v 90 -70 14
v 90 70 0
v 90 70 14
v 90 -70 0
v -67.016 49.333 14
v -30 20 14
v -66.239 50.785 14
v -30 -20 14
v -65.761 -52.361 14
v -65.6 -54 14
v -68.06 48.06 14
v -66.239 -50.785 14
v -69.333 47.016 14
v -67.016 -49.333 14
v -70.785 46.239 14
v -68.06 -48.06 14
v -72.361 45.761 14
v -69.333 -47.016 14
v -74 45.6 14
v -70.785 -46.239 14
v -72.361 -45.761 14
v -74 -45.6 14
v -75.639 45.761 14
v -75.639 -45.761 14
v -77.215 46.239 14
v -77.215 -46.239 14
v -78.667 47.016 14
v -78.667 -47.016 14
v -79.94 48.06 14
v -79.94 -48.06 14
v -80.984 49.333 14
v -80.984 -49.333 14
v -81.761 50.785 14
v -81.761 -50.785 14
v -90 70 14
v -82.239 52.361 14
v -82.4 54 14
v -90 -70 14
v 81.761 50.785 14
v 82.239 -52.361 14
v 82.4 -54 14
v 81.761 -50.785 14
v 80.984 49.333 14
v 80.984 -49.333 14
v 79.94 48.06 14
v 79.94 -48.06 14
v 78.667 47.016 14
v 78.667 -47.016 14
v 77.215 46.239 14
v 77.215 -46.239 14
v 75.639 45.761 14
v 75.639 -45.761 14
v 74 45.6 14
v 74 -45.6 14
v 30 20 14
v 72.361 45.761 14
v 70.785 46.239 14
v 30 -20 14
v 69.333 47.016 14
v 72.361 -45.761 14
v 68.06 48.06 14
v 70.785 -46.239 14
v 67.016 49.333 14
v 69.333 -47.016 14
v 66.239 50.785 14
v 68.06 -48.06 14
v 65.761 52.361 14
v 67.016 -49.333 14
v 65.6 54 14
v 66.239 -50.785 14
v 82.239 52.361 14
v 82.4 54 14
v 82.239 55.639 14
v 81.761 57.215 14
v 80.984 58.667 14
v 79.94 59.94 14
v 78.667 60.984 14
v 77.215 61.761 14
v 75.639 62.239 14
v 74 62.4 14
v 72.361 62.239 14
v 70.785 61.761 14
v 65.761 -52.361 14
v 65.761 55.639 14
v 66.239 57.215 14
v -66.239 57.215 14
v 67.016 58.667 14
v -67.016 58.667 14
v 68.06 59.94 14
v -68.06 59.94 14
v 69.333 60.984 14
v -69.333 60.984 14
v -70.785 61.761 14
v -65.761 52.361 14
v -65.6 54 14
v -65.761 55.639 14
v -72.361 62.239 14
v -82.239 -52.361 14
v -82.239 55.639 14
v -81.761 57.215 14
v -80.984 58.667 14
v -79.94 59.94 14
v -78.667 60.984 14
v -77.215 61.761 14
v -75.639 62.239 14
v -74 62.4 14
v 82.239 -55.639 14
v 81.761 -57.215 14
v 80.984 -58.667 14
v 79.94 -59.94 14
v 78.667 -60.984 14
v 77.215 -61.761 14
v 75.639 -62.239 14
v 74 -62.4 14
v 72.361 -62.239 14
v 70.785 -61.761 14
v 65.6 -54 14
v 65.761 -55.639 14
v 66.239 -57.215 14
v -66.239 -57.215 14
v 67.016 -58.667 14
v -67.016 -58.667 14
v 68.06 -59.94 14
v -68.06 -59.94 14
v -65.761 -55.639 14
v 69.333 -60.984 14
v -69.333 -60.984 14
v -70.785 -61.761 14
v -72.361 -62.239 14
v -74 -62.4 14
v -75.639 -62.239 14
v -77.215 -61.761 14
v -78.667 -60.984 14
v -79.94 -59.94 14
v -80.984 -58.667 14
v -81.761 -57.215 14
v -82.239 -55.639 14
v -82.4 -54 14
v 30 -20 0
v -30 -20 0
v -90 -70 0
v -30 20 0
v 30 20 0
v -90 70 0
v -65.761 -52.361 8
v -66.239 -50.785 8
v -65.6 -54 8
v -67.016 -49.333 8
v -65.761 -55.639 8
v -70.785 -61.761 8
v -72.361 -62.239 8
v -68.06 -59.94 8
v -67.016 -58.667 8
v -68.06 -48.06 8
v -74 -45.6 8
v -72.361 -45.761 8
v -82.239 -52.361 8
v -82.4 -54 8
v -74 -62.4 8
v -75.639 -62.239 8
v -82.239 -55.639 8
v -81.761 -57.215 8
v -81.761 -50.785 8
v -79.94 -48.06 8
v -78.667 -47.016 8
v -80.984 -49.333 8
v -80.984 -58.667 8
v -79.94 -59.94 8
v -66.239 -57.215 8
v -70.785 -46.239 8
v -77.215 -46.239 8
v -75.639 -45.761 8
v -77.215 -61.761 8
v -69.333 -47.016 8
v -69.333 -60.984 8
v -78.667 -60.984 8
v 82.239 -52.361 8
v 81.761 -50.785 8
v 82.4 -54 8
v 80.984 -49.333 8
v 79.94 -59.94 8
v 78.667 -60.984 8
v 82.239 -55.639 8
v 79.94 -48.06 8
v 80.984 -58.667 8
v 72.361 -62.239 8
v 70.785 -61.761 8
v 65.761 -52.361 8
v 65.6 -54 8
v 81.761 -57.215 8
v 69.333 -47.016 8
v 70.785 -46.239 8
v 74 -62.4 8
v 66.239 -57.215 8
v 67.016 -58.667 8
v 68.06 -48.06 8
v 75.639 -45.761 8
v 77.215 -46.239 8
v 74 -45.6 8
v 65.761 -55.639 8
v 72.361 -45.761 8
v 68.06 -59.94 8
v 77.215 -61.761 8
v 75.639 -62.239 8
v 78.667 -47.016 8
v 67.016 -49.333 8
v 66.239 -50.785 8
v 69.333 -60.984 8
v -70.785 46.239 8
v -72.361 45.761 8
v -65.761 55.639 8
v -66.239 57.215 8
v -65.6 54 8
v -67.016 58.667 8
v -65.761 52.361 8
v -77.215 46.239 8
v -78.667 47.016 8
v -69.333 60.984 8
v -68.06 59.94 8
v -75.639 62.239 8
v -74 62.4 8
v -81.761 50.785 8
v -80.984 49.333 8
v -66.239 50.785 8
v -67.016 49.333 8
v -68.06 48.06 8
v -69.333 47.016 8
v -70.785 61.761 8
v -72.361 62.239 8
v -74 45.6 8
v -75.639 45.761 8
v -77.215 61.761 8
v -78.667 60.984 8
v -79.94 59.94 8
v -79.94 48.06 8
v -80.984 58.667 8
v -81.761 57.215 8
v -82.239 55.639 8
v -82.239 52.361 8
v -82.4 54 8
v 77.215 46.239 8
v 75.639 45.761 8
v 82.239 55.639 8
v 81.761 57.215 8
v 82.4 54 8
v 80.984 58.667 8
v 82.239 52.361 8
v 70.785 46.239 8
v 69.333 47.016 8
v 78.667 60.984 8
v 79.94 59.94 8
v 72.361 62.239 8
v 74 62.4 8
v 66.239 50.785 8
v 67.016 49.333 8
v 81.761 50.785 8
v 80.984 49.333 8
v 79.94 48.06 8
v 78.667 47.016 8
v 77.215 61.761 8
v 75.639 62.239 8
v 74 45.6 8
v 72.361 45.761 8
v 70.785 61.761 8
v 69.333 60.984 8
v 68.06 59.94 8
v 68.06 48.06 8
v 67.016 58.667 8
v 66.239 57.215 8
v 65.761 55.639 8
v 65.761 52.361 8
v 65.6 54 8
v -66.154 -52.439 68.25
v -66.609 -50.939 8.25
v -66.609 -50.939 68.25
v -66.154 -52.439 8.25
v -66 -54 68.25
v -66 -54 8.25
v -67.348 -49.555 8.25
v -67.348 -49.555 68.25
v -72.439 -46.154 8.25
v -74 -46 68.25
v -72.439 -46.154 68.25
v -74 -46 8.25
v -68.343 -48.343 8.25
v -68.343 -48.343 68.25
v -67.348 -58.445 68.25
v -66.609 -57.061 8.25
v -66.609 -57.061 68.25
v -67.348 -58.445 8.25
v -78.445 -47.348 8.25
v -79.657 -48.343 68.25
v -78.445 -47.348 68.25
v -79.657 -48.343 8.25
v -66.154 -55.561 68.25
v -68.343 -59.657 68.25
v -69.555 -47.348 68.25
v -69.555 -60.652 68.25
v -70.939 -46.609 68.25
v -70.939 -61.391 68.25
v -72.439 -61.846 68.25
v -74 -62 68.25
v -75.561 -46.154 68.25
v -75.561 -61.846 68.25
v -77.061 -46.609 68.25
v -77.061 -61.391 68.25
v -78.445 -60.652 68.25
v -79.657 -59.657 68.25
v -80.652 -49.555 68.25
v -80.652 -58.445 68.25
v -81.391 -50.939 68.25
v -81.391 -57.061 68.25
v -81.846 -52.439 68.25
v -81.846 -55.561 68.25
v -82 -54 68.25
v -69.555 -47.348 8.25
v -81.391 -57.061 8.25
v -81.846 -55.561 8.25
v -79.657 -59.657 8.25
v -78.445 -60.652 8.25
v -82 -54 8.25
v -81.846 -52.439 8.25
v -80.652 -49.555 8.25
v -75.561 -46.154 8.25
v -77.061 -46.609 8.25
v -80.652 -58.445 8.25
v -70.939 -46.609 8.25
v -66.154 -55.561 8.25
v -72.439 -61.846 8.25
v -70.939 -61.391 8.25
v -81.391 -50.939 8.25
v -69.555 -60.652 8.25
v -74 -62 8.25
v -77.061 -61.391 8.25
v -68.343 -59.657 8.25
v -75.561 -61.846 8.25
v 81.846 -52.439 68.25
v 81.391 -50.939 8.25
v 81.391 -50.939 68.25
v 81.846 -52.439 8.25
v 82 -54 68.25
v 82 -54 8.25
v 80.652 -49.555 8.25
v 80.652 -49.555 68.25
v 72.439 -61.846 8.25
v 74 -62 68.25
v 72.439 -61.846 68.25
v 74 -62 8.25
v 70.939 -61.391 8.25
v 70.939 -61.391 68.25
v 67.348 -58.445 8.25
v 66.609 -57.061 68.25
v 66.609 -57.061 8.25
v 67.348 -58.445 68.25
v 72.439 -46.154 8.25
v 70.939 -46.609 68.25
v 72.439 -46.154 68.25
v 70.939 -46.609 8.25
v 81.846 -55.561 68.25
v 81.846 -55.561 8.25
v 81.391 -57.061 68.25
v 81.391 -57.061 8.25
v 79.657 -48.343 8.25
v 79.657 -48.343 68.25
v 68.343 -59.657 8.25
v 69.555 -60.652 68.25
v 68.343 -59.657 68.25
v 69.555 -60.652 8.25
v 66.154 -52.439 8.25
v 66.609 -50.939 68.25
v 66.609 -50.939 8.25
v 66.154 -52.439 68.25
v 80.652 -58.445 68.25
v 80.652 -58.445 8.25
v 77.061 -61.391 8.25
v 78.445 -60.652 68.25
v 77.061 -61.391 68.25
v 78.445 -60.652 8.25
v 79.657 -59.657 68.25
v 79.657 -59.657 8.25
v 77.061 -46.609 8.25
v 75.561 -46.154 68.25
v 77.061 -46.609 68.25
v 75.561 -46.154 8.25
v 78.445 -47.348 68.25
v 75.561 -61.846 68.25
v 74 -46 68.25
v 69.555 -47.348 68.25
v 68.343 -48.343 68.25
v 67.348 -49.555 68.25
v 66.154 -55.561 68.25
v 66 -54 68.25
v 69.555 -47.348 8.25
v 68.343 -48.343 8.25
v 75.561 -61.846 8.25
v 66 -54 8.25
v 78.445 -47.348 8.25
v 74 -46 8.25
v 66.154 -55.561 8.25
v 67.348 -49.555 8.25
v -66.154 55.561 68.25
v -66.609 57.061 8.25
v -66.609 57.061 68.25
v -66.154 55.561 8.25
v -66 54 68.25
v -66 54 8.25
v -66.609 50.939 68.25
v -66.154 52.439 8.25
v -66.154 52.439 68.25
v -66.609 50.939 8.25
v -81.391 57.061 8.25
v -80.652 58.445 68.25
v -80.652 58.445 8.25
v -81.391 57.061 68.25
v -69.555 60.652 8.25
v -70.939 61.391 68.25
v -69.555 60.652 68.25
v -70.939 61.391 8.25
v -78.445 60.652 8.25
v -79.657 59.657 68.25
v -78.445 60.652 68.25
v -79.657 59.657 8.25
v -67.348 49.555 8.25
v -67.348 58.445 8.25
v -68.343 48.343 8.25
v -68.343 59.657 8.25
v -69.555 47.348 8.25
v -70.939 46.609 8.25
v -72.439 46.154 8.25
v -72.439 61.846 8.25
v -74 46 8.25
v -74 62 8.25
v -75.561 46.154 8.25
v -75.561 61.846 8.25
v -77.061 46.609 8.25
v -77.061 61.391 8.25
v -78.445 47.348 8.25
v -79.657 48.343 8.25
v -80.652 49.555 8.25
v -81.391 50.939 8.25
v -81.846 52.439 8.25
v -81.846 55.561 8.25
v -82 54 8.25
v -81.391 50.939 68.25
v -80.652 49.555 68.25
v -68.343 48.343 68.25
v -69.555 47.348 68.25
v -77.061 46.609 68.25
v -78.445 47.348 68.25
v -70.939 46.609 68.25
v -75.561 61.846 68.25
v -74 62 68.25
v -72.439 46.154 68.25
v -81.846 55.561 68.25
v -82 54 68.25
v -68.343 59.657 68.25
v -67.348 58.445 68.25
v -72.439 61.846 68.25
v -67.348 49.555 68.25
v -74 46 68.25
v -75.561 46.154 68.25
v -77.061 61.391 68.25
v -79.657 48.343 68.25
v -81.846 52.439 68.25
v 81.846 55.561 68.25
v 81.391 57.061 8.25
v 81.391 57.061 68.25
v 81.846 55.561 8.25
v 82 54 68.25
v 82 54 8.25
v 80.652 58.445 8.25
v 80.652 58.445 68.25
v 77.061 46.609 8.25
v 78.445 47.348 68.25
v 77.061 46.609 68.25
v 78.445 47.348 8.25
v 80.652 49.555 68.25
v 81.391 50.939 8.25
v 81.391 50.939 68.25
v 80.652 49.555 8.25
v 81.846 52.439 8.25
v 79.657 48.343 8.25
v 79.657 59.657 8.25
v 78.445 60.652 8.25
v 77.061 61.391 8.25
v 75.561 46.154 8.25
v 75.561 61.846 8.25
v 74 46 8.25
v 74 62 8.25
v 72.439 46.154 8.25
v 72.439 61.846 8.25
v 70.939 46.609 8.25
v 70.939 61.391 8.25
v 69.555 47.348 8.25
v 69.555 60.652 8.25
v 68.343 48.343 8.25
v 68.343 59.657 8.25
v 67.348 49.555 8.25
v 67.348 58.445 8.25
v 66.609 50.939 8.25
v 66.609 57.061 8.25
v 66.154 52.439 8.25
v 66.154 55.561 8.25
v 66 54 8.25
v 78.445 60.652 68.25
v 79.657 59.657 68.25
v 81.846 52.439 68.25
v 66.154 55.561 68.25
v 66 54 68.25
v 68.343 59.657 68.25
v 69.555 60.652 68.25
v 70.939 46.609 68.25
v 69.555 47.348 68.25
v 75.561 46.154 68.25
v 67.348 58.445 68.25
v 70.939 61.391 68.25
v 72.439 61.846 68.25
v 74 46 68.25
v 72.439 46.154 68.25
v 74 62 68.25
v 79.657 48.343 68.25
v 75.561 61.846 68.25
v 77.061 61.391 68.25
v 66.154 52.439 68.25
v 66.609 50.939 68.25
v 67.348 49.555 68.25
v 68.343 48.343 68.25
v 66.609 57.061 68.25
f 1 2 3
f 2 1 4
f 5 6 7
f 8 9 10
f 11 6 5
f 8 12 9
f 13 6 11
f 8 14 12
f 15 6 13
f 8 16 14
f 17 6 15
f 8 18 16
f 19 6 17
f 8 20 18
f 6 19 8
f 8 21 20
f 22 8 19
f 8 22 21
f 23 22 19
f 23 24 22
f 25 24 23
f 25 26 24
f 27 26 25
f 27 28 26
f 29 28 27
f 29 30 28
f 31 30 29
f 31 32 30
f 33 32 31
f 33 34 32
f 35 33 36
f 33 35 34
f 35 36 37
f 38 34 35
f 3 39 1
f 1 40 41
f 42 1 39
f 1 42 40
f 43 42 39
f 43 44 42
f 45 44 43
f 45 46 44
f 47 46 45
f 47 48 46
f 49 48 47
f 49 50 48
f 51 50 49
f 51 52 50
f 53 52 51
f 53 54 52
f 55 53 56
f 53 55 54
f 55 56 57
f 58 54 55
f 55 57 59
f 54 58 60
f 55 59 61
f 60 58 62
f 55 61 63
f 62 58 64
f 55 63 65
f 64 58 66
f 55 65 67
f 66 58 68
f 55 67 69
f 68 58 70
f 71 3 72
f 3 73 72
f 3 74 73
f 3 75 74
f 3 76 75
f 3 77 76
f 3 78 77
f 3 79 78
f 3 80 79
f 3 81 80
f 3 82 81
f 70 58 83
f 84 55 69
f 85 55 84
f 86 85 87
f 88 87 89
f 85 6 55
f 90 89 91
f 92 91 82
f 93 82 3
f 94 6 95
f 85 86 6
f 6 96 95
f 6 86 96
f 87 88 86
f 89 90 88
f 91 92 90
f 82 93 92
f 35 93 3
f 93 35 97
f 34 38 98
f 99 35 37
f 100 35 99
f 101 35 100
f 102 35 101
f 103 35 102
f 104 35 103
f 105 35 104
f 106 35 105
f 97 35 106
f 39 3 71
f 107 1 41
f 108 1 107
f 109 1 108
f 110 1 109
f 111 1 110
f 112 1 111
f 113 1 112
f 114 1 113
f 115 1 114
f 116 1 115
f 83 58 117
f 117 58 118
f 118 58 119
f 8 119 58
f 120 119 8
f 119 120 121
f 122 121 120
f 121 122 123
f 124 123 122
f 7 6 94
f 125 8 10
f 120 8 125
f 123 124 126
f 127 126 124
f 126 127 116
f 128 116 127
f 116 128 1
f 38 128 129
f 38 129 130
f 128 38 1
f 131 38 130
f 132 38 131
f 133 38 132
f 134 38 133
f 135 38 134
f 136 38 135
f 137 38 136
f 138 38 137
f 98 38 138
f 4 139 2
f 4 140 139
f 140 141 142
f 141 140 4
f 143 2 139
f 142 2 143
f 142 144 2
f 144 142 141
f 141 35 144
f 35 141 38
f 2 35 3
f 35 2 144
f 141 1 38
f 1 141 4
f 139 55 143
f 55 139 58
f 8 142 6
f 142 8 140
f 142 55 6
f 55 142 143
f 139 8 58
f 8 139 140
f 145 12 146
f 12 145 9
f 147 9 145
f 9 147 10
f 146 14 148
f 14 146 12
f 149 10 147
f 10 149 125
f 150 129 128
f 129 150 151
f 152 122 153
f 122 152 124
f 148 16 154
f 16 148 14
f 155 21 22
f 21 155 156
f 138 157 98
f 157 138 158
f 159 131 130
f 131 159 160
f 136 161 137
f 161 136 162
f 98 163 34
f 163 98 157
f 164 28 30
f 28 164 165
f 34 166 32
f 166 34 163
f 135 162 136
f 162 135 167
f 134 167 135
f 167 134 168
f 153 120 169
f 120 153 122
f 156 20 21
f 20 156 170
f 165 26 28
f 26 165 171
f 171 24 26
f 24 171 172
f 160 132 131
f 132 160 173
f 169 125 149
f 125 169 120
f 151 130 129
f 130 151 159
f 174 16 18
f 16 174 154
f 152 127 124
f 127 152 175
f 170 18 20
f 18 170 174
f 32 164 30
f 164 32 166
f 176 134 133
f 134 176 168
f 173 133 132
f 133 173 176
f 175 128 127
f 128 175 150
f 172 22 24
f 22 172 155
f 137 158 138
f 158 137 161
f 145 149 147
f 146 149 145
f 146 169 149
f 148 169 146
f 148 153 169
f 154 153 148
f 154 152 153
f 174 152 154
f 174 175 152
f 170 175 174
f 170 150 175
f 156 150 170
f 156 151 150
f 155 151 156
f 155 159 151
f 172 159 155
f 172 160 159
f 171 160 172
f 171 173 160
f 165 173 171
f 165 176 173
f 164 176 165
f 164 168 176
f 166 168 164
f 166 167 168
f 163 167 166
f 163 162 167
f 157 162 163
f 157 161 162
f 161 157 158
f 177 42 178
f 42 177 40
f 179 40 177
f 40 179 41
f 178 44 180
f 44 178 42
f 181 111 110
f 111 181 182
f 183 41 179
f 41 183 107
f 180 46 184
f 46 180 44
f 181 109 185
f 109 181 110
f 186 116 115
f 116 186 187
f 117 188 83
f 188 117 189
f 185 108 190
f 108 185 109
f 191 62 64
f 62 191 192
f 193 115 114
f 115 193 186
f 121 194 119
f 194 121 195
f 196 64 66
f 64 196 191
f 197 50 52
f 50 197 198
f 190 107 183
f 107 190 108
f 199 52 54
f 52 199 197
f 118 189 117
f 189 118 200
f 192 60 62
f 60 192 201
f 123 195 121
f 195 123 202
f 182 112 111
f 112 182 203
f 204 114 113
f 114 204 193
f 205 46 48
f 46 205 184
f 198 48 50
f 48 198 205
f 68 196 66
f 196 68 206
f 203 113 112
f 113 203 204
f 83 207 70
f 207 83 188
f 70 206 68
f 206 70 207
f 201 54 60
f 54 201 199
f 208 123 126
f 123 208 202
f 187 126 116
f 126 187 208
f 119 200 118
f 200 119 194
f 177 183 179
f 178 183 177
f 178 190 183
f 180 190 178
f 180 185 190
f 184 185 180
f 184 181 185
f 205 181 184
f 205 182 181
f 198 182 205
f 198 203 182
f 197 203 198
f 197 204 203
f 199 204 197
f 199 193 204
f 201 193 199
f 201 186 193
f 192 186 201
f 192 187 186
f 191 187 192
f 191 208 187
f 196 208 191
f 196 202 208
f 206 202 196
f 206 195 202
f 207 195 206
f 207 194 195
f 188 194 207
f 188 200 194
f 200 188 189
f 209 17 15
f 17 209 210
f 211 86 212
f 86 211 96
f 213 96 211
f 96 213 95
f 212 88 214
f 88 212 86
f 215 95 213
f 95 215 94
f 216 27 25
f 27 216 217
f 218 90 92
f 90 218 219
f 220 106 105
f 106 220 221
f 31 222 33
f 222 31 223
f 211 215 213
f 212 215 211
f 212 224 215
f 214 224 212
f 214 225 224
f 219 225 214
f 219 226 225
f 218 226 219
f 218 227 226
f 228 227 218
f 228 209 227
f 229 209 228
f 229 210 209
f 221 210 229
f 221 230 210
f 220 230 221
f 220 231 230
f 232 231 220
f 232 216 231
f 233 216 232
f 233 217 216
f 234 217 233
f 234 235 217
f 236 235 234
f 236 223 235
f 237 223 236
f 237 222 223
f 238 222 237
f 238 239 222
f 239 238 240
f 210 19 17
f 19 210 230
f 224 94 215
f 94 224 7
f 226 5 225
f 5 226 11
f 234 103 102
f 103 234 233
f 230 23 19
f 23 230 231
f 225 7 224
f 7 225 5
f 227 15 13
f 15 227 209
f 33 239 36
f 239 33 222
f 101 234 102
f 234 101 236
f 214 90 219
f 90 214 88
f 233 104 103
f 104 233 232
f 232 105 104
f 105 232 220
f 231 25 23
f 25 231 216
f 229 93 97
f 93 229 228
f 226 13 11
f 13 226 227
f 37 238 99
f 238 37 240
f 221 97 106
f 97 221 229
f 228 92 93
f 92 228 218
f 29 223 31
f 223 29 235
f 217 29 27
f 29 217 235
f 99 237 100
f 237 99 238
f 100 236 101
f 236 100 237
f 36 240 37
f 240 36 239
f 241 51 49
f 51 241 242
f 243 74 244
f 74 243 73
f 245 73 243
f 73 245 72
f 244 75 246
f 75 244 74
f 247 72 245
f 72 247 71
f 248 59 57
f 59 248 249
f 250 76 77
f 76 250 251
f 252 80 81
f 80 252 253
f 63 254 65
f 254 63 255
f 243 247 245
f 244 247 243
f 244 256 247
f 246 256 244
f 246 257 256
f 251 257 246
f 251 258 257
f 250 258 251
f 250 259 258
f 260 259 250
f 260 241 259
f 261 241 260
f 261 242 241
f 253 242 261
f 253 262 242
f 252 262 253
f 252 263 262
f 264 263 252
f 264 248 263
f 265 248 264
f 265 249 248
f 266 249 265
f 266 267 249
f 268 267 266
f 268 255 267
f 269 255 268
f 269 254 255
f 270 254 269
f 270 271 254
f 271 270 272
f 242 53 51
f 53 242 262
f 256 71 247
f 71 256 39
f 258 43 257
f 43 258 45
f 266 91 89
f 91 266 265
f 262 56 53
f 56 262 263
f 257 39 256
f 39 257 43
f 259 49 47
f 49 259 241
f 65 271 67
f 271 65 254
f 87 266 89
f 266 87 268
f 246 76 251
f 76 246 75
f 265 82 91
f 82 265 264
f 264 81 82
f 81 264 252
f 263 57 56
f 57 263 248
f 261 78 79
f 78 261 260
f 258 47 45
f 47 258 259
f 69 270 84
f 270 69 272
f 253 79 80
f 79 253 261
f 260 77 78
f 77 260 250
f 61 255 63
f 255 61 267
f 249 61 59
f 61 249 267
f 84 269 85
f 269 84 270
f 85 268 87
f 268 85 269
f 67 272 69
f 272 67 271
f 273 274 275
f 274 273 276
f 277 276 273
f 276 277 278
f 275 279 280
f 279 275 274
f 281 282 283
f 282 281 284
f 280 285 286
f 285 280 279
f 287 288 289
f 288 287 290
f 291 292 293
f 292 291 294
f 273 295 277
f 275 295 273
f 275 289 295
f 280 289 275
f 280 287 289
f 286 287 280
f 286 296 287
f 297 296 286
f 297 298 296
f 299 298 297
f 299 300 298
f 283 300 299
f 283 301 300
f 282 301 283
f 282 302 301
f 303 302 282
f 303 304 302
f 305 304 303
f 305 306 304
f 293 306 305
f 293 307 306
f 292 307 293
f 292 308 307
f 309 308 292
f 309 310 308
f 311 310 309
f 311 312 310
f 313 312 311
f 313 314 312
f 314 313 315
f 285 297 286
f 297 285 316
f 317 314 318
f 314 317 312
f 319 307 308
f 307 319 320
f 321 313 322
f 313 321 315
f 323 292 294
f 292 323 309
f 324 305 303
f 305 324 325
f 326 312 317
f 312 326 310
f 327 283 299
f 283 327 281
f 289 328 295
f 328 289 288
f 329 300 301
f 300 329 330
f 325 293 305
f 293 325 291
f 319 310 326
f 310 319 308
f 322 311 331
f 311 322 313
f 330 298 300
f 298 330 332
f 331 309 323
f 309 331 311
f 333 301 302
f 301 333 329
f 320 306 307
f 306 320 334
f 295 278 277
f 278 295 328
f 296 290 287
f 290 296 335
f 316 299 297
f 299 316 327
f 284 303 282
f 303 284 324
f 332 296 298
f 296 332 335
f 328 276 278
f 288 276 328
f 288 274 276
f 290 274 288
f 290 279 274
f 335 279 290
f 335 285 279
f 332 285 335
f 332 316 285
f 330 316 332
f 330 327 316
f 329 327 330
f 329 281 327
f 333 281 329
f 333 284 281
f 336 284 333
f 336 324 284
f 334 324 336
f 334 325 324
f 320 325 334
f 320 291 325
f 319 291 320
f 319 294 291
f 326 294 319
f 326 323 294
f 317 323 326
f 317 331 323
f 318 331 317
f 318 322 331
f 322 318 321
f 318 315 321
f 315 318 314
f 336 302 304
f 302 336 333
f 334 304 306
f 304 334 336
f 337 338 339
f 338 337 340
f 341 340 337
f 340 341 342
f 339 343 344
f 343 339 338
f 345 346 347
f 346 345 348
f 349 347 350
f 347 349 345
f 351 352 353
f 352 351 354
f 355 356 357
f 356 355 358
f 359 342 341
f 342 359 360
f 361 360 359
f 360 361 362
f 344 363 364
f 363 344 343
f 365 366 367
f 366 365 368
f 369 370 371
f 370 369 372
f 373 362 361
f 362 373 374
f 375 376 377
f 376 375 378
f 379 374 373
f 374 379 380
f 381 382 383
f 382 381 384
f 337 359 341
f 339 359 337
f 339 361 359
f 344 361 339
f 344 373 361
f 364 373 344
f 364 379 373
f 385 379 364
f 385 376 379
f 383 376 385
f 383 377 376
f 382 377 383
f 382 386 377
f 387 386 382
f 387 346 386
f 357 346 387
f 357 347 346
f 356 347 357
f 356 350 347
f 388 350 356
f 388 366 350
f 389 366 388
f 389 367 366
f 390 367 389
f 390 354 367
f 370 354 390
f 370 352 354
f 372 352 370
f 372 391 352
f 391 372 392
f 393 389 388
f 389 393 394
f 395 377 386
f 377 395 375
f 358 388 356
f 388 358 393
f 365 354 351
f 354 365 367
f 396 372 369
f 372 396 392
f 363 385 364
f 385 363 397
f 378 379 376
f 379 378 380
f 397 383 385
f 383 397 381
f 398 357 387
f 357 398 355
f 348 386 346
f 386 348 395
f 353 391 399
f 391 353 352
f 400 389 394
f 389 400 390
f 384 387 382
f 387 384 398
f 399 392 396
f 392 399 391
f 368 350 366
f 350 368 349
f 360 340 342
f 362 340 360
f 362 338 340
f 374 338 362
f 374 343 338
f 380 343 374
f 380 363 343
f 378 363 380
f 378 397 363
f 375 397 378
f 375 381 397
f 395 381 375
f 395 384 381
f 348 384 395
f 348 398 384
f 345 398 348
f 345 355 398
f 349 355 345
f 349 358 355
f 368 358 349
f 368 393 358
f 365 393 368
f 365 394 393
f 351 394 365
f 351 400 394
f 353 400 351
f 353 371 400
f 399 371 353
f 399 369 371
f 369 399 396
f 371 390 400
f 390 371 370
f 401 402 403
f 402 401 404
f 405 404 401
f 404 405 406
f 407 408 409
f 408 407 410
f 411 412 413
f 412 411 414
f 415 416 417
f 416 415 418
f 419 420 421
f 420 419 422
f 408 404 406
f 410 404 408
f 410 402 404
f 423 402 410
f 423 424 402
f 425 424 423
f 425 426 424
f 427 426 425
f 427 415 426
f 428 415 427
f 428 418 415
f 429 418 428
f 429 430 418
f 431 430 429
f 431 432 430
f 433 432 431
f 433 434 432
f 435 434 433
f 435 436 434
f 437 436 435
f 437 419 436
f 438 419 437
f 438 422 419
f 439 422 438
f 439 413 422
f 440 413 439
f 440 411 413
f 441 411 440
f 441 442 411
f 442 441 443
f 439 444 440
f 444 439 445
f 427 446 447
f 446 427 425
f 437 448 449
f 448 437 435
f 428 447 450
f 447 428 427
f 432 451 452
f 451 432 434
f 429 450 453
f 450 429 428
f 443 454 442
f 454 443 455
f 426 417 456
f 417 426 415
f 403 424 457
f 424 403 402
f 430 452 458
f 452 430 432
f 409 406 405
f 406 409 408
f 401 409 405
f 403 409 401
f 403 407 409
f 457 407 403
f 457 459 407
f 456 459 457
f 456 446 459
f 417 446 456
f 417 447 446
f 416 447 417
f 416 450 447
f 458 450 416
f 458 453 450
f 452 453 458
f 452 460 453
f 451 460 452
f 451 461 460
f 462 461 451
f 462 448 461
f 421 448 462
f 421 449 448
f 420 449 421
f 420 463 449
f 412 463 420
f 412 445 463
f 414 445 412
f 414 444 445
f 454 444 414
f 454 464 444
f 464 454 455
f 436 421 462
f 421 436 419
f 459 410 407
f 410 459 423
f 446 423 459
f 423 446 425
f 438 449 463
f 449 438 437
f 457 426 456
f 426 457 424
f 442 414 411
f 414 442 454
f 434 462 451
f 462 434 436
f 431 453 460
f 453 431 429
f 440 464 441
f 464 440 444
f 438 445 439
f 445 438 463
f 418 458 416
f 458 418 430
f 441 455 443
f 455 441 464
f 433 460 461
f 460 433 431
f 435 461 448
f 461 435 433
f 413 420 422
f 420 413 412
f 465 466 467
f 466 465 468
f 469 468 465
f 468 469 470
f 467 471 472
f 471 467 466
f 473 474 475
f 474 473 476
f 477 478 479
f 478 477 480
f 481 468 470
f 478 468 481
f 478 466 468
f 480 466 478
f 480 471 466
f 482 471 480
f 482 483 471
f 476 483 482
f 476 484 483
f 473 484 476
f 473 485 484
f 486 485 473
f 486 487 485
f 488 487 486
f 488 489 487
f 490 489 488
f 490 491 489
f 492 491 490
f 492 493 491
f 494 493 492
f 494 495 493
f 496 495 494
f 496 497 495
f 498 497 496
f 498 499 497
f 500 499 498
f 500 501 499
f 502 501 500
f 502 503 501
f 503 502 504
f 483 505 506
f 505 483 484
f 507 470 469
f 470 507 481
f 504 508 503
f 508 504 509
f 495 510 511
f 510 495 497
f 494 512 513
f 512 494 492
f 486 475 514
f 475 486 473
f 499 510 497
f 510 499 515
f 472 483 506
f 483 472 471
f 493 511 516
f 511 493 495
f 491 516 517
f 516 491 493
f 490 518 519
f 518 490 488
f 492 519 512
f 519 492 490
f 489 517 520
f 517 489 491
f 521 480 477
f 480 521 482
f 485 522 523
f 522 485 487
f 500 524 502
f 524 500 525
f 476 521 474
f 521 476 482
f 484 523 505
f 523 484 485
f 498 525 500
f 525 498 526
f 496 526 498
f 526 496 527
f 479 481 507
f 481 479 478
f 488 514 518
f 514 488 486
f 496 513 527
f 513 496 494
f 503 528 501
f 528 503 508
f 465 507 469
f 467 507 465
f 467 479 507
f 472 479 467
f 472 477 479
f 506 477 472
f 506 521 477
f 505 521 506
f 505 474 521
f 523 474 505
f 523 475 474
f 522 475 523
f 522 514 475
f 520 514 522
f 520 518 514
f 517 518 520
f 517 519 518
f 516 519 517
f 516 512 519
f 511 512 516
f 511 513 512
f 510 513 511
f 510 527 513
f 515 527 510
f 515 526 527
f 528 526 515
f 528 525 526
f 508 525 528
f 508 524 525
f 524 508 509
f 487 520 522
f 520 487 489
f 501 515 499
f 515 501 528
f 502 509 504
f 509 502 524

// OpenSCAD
$fn = 32;

// ------------------------------------------------------------------------
// Frame with four posts: 180 x 140 mm frame, four d16 posts
// Every part is its own module, assembly() places them once.
// ------------------------------------------------------------------------

// --- part 1 ---
module base_frame() {
  difference() {
    translate([-90, -70, 0]) cube([180, 140, 14]);
    translate([-30, -20, -1]) cube([60, 40, 16]);
    translate([-74, -54, 8]) cylinder(h = 7, d = 16.8);
    translate([74, -54, 8]) cylinder(h = 7, d = 16.8);
    translate([-74, 54, 8]) cylinder(h = 7, d = 16.8);
    translate([74, 54, 8]) cylinder(h = 7, d = 16.8);
  }
}

// --- part 2 ---
module post1() {
  cylinder(h = 60, d = 16);
}

// --- part 3 ---
module post2() {
  cylinder(h = 60, d = 16);
}

// --- part 4 ---
module post3() {
  cylinder(h = 60, d = 16);
}

// --- part 5 ---
module post4() {
  cylinder(h = 60, d = 16);
}

// --- assembly ---
module assembly() {
  translate([0, 0, 0]) rotate([0, 0, 0]) base_frame();
  translate([-74, -54, 8.25]) rotate([0, 0, 0]) post1();
  translate([74, -54, 8.25]) rotate([0, 0, 0]) post2();
  translate([-74, 54, 8.25]) rotate([0, 0, 0]) post3();
  translate([74, 54, 8.25]) rotate([0, 0, 0]) post4();
}

assembly();
